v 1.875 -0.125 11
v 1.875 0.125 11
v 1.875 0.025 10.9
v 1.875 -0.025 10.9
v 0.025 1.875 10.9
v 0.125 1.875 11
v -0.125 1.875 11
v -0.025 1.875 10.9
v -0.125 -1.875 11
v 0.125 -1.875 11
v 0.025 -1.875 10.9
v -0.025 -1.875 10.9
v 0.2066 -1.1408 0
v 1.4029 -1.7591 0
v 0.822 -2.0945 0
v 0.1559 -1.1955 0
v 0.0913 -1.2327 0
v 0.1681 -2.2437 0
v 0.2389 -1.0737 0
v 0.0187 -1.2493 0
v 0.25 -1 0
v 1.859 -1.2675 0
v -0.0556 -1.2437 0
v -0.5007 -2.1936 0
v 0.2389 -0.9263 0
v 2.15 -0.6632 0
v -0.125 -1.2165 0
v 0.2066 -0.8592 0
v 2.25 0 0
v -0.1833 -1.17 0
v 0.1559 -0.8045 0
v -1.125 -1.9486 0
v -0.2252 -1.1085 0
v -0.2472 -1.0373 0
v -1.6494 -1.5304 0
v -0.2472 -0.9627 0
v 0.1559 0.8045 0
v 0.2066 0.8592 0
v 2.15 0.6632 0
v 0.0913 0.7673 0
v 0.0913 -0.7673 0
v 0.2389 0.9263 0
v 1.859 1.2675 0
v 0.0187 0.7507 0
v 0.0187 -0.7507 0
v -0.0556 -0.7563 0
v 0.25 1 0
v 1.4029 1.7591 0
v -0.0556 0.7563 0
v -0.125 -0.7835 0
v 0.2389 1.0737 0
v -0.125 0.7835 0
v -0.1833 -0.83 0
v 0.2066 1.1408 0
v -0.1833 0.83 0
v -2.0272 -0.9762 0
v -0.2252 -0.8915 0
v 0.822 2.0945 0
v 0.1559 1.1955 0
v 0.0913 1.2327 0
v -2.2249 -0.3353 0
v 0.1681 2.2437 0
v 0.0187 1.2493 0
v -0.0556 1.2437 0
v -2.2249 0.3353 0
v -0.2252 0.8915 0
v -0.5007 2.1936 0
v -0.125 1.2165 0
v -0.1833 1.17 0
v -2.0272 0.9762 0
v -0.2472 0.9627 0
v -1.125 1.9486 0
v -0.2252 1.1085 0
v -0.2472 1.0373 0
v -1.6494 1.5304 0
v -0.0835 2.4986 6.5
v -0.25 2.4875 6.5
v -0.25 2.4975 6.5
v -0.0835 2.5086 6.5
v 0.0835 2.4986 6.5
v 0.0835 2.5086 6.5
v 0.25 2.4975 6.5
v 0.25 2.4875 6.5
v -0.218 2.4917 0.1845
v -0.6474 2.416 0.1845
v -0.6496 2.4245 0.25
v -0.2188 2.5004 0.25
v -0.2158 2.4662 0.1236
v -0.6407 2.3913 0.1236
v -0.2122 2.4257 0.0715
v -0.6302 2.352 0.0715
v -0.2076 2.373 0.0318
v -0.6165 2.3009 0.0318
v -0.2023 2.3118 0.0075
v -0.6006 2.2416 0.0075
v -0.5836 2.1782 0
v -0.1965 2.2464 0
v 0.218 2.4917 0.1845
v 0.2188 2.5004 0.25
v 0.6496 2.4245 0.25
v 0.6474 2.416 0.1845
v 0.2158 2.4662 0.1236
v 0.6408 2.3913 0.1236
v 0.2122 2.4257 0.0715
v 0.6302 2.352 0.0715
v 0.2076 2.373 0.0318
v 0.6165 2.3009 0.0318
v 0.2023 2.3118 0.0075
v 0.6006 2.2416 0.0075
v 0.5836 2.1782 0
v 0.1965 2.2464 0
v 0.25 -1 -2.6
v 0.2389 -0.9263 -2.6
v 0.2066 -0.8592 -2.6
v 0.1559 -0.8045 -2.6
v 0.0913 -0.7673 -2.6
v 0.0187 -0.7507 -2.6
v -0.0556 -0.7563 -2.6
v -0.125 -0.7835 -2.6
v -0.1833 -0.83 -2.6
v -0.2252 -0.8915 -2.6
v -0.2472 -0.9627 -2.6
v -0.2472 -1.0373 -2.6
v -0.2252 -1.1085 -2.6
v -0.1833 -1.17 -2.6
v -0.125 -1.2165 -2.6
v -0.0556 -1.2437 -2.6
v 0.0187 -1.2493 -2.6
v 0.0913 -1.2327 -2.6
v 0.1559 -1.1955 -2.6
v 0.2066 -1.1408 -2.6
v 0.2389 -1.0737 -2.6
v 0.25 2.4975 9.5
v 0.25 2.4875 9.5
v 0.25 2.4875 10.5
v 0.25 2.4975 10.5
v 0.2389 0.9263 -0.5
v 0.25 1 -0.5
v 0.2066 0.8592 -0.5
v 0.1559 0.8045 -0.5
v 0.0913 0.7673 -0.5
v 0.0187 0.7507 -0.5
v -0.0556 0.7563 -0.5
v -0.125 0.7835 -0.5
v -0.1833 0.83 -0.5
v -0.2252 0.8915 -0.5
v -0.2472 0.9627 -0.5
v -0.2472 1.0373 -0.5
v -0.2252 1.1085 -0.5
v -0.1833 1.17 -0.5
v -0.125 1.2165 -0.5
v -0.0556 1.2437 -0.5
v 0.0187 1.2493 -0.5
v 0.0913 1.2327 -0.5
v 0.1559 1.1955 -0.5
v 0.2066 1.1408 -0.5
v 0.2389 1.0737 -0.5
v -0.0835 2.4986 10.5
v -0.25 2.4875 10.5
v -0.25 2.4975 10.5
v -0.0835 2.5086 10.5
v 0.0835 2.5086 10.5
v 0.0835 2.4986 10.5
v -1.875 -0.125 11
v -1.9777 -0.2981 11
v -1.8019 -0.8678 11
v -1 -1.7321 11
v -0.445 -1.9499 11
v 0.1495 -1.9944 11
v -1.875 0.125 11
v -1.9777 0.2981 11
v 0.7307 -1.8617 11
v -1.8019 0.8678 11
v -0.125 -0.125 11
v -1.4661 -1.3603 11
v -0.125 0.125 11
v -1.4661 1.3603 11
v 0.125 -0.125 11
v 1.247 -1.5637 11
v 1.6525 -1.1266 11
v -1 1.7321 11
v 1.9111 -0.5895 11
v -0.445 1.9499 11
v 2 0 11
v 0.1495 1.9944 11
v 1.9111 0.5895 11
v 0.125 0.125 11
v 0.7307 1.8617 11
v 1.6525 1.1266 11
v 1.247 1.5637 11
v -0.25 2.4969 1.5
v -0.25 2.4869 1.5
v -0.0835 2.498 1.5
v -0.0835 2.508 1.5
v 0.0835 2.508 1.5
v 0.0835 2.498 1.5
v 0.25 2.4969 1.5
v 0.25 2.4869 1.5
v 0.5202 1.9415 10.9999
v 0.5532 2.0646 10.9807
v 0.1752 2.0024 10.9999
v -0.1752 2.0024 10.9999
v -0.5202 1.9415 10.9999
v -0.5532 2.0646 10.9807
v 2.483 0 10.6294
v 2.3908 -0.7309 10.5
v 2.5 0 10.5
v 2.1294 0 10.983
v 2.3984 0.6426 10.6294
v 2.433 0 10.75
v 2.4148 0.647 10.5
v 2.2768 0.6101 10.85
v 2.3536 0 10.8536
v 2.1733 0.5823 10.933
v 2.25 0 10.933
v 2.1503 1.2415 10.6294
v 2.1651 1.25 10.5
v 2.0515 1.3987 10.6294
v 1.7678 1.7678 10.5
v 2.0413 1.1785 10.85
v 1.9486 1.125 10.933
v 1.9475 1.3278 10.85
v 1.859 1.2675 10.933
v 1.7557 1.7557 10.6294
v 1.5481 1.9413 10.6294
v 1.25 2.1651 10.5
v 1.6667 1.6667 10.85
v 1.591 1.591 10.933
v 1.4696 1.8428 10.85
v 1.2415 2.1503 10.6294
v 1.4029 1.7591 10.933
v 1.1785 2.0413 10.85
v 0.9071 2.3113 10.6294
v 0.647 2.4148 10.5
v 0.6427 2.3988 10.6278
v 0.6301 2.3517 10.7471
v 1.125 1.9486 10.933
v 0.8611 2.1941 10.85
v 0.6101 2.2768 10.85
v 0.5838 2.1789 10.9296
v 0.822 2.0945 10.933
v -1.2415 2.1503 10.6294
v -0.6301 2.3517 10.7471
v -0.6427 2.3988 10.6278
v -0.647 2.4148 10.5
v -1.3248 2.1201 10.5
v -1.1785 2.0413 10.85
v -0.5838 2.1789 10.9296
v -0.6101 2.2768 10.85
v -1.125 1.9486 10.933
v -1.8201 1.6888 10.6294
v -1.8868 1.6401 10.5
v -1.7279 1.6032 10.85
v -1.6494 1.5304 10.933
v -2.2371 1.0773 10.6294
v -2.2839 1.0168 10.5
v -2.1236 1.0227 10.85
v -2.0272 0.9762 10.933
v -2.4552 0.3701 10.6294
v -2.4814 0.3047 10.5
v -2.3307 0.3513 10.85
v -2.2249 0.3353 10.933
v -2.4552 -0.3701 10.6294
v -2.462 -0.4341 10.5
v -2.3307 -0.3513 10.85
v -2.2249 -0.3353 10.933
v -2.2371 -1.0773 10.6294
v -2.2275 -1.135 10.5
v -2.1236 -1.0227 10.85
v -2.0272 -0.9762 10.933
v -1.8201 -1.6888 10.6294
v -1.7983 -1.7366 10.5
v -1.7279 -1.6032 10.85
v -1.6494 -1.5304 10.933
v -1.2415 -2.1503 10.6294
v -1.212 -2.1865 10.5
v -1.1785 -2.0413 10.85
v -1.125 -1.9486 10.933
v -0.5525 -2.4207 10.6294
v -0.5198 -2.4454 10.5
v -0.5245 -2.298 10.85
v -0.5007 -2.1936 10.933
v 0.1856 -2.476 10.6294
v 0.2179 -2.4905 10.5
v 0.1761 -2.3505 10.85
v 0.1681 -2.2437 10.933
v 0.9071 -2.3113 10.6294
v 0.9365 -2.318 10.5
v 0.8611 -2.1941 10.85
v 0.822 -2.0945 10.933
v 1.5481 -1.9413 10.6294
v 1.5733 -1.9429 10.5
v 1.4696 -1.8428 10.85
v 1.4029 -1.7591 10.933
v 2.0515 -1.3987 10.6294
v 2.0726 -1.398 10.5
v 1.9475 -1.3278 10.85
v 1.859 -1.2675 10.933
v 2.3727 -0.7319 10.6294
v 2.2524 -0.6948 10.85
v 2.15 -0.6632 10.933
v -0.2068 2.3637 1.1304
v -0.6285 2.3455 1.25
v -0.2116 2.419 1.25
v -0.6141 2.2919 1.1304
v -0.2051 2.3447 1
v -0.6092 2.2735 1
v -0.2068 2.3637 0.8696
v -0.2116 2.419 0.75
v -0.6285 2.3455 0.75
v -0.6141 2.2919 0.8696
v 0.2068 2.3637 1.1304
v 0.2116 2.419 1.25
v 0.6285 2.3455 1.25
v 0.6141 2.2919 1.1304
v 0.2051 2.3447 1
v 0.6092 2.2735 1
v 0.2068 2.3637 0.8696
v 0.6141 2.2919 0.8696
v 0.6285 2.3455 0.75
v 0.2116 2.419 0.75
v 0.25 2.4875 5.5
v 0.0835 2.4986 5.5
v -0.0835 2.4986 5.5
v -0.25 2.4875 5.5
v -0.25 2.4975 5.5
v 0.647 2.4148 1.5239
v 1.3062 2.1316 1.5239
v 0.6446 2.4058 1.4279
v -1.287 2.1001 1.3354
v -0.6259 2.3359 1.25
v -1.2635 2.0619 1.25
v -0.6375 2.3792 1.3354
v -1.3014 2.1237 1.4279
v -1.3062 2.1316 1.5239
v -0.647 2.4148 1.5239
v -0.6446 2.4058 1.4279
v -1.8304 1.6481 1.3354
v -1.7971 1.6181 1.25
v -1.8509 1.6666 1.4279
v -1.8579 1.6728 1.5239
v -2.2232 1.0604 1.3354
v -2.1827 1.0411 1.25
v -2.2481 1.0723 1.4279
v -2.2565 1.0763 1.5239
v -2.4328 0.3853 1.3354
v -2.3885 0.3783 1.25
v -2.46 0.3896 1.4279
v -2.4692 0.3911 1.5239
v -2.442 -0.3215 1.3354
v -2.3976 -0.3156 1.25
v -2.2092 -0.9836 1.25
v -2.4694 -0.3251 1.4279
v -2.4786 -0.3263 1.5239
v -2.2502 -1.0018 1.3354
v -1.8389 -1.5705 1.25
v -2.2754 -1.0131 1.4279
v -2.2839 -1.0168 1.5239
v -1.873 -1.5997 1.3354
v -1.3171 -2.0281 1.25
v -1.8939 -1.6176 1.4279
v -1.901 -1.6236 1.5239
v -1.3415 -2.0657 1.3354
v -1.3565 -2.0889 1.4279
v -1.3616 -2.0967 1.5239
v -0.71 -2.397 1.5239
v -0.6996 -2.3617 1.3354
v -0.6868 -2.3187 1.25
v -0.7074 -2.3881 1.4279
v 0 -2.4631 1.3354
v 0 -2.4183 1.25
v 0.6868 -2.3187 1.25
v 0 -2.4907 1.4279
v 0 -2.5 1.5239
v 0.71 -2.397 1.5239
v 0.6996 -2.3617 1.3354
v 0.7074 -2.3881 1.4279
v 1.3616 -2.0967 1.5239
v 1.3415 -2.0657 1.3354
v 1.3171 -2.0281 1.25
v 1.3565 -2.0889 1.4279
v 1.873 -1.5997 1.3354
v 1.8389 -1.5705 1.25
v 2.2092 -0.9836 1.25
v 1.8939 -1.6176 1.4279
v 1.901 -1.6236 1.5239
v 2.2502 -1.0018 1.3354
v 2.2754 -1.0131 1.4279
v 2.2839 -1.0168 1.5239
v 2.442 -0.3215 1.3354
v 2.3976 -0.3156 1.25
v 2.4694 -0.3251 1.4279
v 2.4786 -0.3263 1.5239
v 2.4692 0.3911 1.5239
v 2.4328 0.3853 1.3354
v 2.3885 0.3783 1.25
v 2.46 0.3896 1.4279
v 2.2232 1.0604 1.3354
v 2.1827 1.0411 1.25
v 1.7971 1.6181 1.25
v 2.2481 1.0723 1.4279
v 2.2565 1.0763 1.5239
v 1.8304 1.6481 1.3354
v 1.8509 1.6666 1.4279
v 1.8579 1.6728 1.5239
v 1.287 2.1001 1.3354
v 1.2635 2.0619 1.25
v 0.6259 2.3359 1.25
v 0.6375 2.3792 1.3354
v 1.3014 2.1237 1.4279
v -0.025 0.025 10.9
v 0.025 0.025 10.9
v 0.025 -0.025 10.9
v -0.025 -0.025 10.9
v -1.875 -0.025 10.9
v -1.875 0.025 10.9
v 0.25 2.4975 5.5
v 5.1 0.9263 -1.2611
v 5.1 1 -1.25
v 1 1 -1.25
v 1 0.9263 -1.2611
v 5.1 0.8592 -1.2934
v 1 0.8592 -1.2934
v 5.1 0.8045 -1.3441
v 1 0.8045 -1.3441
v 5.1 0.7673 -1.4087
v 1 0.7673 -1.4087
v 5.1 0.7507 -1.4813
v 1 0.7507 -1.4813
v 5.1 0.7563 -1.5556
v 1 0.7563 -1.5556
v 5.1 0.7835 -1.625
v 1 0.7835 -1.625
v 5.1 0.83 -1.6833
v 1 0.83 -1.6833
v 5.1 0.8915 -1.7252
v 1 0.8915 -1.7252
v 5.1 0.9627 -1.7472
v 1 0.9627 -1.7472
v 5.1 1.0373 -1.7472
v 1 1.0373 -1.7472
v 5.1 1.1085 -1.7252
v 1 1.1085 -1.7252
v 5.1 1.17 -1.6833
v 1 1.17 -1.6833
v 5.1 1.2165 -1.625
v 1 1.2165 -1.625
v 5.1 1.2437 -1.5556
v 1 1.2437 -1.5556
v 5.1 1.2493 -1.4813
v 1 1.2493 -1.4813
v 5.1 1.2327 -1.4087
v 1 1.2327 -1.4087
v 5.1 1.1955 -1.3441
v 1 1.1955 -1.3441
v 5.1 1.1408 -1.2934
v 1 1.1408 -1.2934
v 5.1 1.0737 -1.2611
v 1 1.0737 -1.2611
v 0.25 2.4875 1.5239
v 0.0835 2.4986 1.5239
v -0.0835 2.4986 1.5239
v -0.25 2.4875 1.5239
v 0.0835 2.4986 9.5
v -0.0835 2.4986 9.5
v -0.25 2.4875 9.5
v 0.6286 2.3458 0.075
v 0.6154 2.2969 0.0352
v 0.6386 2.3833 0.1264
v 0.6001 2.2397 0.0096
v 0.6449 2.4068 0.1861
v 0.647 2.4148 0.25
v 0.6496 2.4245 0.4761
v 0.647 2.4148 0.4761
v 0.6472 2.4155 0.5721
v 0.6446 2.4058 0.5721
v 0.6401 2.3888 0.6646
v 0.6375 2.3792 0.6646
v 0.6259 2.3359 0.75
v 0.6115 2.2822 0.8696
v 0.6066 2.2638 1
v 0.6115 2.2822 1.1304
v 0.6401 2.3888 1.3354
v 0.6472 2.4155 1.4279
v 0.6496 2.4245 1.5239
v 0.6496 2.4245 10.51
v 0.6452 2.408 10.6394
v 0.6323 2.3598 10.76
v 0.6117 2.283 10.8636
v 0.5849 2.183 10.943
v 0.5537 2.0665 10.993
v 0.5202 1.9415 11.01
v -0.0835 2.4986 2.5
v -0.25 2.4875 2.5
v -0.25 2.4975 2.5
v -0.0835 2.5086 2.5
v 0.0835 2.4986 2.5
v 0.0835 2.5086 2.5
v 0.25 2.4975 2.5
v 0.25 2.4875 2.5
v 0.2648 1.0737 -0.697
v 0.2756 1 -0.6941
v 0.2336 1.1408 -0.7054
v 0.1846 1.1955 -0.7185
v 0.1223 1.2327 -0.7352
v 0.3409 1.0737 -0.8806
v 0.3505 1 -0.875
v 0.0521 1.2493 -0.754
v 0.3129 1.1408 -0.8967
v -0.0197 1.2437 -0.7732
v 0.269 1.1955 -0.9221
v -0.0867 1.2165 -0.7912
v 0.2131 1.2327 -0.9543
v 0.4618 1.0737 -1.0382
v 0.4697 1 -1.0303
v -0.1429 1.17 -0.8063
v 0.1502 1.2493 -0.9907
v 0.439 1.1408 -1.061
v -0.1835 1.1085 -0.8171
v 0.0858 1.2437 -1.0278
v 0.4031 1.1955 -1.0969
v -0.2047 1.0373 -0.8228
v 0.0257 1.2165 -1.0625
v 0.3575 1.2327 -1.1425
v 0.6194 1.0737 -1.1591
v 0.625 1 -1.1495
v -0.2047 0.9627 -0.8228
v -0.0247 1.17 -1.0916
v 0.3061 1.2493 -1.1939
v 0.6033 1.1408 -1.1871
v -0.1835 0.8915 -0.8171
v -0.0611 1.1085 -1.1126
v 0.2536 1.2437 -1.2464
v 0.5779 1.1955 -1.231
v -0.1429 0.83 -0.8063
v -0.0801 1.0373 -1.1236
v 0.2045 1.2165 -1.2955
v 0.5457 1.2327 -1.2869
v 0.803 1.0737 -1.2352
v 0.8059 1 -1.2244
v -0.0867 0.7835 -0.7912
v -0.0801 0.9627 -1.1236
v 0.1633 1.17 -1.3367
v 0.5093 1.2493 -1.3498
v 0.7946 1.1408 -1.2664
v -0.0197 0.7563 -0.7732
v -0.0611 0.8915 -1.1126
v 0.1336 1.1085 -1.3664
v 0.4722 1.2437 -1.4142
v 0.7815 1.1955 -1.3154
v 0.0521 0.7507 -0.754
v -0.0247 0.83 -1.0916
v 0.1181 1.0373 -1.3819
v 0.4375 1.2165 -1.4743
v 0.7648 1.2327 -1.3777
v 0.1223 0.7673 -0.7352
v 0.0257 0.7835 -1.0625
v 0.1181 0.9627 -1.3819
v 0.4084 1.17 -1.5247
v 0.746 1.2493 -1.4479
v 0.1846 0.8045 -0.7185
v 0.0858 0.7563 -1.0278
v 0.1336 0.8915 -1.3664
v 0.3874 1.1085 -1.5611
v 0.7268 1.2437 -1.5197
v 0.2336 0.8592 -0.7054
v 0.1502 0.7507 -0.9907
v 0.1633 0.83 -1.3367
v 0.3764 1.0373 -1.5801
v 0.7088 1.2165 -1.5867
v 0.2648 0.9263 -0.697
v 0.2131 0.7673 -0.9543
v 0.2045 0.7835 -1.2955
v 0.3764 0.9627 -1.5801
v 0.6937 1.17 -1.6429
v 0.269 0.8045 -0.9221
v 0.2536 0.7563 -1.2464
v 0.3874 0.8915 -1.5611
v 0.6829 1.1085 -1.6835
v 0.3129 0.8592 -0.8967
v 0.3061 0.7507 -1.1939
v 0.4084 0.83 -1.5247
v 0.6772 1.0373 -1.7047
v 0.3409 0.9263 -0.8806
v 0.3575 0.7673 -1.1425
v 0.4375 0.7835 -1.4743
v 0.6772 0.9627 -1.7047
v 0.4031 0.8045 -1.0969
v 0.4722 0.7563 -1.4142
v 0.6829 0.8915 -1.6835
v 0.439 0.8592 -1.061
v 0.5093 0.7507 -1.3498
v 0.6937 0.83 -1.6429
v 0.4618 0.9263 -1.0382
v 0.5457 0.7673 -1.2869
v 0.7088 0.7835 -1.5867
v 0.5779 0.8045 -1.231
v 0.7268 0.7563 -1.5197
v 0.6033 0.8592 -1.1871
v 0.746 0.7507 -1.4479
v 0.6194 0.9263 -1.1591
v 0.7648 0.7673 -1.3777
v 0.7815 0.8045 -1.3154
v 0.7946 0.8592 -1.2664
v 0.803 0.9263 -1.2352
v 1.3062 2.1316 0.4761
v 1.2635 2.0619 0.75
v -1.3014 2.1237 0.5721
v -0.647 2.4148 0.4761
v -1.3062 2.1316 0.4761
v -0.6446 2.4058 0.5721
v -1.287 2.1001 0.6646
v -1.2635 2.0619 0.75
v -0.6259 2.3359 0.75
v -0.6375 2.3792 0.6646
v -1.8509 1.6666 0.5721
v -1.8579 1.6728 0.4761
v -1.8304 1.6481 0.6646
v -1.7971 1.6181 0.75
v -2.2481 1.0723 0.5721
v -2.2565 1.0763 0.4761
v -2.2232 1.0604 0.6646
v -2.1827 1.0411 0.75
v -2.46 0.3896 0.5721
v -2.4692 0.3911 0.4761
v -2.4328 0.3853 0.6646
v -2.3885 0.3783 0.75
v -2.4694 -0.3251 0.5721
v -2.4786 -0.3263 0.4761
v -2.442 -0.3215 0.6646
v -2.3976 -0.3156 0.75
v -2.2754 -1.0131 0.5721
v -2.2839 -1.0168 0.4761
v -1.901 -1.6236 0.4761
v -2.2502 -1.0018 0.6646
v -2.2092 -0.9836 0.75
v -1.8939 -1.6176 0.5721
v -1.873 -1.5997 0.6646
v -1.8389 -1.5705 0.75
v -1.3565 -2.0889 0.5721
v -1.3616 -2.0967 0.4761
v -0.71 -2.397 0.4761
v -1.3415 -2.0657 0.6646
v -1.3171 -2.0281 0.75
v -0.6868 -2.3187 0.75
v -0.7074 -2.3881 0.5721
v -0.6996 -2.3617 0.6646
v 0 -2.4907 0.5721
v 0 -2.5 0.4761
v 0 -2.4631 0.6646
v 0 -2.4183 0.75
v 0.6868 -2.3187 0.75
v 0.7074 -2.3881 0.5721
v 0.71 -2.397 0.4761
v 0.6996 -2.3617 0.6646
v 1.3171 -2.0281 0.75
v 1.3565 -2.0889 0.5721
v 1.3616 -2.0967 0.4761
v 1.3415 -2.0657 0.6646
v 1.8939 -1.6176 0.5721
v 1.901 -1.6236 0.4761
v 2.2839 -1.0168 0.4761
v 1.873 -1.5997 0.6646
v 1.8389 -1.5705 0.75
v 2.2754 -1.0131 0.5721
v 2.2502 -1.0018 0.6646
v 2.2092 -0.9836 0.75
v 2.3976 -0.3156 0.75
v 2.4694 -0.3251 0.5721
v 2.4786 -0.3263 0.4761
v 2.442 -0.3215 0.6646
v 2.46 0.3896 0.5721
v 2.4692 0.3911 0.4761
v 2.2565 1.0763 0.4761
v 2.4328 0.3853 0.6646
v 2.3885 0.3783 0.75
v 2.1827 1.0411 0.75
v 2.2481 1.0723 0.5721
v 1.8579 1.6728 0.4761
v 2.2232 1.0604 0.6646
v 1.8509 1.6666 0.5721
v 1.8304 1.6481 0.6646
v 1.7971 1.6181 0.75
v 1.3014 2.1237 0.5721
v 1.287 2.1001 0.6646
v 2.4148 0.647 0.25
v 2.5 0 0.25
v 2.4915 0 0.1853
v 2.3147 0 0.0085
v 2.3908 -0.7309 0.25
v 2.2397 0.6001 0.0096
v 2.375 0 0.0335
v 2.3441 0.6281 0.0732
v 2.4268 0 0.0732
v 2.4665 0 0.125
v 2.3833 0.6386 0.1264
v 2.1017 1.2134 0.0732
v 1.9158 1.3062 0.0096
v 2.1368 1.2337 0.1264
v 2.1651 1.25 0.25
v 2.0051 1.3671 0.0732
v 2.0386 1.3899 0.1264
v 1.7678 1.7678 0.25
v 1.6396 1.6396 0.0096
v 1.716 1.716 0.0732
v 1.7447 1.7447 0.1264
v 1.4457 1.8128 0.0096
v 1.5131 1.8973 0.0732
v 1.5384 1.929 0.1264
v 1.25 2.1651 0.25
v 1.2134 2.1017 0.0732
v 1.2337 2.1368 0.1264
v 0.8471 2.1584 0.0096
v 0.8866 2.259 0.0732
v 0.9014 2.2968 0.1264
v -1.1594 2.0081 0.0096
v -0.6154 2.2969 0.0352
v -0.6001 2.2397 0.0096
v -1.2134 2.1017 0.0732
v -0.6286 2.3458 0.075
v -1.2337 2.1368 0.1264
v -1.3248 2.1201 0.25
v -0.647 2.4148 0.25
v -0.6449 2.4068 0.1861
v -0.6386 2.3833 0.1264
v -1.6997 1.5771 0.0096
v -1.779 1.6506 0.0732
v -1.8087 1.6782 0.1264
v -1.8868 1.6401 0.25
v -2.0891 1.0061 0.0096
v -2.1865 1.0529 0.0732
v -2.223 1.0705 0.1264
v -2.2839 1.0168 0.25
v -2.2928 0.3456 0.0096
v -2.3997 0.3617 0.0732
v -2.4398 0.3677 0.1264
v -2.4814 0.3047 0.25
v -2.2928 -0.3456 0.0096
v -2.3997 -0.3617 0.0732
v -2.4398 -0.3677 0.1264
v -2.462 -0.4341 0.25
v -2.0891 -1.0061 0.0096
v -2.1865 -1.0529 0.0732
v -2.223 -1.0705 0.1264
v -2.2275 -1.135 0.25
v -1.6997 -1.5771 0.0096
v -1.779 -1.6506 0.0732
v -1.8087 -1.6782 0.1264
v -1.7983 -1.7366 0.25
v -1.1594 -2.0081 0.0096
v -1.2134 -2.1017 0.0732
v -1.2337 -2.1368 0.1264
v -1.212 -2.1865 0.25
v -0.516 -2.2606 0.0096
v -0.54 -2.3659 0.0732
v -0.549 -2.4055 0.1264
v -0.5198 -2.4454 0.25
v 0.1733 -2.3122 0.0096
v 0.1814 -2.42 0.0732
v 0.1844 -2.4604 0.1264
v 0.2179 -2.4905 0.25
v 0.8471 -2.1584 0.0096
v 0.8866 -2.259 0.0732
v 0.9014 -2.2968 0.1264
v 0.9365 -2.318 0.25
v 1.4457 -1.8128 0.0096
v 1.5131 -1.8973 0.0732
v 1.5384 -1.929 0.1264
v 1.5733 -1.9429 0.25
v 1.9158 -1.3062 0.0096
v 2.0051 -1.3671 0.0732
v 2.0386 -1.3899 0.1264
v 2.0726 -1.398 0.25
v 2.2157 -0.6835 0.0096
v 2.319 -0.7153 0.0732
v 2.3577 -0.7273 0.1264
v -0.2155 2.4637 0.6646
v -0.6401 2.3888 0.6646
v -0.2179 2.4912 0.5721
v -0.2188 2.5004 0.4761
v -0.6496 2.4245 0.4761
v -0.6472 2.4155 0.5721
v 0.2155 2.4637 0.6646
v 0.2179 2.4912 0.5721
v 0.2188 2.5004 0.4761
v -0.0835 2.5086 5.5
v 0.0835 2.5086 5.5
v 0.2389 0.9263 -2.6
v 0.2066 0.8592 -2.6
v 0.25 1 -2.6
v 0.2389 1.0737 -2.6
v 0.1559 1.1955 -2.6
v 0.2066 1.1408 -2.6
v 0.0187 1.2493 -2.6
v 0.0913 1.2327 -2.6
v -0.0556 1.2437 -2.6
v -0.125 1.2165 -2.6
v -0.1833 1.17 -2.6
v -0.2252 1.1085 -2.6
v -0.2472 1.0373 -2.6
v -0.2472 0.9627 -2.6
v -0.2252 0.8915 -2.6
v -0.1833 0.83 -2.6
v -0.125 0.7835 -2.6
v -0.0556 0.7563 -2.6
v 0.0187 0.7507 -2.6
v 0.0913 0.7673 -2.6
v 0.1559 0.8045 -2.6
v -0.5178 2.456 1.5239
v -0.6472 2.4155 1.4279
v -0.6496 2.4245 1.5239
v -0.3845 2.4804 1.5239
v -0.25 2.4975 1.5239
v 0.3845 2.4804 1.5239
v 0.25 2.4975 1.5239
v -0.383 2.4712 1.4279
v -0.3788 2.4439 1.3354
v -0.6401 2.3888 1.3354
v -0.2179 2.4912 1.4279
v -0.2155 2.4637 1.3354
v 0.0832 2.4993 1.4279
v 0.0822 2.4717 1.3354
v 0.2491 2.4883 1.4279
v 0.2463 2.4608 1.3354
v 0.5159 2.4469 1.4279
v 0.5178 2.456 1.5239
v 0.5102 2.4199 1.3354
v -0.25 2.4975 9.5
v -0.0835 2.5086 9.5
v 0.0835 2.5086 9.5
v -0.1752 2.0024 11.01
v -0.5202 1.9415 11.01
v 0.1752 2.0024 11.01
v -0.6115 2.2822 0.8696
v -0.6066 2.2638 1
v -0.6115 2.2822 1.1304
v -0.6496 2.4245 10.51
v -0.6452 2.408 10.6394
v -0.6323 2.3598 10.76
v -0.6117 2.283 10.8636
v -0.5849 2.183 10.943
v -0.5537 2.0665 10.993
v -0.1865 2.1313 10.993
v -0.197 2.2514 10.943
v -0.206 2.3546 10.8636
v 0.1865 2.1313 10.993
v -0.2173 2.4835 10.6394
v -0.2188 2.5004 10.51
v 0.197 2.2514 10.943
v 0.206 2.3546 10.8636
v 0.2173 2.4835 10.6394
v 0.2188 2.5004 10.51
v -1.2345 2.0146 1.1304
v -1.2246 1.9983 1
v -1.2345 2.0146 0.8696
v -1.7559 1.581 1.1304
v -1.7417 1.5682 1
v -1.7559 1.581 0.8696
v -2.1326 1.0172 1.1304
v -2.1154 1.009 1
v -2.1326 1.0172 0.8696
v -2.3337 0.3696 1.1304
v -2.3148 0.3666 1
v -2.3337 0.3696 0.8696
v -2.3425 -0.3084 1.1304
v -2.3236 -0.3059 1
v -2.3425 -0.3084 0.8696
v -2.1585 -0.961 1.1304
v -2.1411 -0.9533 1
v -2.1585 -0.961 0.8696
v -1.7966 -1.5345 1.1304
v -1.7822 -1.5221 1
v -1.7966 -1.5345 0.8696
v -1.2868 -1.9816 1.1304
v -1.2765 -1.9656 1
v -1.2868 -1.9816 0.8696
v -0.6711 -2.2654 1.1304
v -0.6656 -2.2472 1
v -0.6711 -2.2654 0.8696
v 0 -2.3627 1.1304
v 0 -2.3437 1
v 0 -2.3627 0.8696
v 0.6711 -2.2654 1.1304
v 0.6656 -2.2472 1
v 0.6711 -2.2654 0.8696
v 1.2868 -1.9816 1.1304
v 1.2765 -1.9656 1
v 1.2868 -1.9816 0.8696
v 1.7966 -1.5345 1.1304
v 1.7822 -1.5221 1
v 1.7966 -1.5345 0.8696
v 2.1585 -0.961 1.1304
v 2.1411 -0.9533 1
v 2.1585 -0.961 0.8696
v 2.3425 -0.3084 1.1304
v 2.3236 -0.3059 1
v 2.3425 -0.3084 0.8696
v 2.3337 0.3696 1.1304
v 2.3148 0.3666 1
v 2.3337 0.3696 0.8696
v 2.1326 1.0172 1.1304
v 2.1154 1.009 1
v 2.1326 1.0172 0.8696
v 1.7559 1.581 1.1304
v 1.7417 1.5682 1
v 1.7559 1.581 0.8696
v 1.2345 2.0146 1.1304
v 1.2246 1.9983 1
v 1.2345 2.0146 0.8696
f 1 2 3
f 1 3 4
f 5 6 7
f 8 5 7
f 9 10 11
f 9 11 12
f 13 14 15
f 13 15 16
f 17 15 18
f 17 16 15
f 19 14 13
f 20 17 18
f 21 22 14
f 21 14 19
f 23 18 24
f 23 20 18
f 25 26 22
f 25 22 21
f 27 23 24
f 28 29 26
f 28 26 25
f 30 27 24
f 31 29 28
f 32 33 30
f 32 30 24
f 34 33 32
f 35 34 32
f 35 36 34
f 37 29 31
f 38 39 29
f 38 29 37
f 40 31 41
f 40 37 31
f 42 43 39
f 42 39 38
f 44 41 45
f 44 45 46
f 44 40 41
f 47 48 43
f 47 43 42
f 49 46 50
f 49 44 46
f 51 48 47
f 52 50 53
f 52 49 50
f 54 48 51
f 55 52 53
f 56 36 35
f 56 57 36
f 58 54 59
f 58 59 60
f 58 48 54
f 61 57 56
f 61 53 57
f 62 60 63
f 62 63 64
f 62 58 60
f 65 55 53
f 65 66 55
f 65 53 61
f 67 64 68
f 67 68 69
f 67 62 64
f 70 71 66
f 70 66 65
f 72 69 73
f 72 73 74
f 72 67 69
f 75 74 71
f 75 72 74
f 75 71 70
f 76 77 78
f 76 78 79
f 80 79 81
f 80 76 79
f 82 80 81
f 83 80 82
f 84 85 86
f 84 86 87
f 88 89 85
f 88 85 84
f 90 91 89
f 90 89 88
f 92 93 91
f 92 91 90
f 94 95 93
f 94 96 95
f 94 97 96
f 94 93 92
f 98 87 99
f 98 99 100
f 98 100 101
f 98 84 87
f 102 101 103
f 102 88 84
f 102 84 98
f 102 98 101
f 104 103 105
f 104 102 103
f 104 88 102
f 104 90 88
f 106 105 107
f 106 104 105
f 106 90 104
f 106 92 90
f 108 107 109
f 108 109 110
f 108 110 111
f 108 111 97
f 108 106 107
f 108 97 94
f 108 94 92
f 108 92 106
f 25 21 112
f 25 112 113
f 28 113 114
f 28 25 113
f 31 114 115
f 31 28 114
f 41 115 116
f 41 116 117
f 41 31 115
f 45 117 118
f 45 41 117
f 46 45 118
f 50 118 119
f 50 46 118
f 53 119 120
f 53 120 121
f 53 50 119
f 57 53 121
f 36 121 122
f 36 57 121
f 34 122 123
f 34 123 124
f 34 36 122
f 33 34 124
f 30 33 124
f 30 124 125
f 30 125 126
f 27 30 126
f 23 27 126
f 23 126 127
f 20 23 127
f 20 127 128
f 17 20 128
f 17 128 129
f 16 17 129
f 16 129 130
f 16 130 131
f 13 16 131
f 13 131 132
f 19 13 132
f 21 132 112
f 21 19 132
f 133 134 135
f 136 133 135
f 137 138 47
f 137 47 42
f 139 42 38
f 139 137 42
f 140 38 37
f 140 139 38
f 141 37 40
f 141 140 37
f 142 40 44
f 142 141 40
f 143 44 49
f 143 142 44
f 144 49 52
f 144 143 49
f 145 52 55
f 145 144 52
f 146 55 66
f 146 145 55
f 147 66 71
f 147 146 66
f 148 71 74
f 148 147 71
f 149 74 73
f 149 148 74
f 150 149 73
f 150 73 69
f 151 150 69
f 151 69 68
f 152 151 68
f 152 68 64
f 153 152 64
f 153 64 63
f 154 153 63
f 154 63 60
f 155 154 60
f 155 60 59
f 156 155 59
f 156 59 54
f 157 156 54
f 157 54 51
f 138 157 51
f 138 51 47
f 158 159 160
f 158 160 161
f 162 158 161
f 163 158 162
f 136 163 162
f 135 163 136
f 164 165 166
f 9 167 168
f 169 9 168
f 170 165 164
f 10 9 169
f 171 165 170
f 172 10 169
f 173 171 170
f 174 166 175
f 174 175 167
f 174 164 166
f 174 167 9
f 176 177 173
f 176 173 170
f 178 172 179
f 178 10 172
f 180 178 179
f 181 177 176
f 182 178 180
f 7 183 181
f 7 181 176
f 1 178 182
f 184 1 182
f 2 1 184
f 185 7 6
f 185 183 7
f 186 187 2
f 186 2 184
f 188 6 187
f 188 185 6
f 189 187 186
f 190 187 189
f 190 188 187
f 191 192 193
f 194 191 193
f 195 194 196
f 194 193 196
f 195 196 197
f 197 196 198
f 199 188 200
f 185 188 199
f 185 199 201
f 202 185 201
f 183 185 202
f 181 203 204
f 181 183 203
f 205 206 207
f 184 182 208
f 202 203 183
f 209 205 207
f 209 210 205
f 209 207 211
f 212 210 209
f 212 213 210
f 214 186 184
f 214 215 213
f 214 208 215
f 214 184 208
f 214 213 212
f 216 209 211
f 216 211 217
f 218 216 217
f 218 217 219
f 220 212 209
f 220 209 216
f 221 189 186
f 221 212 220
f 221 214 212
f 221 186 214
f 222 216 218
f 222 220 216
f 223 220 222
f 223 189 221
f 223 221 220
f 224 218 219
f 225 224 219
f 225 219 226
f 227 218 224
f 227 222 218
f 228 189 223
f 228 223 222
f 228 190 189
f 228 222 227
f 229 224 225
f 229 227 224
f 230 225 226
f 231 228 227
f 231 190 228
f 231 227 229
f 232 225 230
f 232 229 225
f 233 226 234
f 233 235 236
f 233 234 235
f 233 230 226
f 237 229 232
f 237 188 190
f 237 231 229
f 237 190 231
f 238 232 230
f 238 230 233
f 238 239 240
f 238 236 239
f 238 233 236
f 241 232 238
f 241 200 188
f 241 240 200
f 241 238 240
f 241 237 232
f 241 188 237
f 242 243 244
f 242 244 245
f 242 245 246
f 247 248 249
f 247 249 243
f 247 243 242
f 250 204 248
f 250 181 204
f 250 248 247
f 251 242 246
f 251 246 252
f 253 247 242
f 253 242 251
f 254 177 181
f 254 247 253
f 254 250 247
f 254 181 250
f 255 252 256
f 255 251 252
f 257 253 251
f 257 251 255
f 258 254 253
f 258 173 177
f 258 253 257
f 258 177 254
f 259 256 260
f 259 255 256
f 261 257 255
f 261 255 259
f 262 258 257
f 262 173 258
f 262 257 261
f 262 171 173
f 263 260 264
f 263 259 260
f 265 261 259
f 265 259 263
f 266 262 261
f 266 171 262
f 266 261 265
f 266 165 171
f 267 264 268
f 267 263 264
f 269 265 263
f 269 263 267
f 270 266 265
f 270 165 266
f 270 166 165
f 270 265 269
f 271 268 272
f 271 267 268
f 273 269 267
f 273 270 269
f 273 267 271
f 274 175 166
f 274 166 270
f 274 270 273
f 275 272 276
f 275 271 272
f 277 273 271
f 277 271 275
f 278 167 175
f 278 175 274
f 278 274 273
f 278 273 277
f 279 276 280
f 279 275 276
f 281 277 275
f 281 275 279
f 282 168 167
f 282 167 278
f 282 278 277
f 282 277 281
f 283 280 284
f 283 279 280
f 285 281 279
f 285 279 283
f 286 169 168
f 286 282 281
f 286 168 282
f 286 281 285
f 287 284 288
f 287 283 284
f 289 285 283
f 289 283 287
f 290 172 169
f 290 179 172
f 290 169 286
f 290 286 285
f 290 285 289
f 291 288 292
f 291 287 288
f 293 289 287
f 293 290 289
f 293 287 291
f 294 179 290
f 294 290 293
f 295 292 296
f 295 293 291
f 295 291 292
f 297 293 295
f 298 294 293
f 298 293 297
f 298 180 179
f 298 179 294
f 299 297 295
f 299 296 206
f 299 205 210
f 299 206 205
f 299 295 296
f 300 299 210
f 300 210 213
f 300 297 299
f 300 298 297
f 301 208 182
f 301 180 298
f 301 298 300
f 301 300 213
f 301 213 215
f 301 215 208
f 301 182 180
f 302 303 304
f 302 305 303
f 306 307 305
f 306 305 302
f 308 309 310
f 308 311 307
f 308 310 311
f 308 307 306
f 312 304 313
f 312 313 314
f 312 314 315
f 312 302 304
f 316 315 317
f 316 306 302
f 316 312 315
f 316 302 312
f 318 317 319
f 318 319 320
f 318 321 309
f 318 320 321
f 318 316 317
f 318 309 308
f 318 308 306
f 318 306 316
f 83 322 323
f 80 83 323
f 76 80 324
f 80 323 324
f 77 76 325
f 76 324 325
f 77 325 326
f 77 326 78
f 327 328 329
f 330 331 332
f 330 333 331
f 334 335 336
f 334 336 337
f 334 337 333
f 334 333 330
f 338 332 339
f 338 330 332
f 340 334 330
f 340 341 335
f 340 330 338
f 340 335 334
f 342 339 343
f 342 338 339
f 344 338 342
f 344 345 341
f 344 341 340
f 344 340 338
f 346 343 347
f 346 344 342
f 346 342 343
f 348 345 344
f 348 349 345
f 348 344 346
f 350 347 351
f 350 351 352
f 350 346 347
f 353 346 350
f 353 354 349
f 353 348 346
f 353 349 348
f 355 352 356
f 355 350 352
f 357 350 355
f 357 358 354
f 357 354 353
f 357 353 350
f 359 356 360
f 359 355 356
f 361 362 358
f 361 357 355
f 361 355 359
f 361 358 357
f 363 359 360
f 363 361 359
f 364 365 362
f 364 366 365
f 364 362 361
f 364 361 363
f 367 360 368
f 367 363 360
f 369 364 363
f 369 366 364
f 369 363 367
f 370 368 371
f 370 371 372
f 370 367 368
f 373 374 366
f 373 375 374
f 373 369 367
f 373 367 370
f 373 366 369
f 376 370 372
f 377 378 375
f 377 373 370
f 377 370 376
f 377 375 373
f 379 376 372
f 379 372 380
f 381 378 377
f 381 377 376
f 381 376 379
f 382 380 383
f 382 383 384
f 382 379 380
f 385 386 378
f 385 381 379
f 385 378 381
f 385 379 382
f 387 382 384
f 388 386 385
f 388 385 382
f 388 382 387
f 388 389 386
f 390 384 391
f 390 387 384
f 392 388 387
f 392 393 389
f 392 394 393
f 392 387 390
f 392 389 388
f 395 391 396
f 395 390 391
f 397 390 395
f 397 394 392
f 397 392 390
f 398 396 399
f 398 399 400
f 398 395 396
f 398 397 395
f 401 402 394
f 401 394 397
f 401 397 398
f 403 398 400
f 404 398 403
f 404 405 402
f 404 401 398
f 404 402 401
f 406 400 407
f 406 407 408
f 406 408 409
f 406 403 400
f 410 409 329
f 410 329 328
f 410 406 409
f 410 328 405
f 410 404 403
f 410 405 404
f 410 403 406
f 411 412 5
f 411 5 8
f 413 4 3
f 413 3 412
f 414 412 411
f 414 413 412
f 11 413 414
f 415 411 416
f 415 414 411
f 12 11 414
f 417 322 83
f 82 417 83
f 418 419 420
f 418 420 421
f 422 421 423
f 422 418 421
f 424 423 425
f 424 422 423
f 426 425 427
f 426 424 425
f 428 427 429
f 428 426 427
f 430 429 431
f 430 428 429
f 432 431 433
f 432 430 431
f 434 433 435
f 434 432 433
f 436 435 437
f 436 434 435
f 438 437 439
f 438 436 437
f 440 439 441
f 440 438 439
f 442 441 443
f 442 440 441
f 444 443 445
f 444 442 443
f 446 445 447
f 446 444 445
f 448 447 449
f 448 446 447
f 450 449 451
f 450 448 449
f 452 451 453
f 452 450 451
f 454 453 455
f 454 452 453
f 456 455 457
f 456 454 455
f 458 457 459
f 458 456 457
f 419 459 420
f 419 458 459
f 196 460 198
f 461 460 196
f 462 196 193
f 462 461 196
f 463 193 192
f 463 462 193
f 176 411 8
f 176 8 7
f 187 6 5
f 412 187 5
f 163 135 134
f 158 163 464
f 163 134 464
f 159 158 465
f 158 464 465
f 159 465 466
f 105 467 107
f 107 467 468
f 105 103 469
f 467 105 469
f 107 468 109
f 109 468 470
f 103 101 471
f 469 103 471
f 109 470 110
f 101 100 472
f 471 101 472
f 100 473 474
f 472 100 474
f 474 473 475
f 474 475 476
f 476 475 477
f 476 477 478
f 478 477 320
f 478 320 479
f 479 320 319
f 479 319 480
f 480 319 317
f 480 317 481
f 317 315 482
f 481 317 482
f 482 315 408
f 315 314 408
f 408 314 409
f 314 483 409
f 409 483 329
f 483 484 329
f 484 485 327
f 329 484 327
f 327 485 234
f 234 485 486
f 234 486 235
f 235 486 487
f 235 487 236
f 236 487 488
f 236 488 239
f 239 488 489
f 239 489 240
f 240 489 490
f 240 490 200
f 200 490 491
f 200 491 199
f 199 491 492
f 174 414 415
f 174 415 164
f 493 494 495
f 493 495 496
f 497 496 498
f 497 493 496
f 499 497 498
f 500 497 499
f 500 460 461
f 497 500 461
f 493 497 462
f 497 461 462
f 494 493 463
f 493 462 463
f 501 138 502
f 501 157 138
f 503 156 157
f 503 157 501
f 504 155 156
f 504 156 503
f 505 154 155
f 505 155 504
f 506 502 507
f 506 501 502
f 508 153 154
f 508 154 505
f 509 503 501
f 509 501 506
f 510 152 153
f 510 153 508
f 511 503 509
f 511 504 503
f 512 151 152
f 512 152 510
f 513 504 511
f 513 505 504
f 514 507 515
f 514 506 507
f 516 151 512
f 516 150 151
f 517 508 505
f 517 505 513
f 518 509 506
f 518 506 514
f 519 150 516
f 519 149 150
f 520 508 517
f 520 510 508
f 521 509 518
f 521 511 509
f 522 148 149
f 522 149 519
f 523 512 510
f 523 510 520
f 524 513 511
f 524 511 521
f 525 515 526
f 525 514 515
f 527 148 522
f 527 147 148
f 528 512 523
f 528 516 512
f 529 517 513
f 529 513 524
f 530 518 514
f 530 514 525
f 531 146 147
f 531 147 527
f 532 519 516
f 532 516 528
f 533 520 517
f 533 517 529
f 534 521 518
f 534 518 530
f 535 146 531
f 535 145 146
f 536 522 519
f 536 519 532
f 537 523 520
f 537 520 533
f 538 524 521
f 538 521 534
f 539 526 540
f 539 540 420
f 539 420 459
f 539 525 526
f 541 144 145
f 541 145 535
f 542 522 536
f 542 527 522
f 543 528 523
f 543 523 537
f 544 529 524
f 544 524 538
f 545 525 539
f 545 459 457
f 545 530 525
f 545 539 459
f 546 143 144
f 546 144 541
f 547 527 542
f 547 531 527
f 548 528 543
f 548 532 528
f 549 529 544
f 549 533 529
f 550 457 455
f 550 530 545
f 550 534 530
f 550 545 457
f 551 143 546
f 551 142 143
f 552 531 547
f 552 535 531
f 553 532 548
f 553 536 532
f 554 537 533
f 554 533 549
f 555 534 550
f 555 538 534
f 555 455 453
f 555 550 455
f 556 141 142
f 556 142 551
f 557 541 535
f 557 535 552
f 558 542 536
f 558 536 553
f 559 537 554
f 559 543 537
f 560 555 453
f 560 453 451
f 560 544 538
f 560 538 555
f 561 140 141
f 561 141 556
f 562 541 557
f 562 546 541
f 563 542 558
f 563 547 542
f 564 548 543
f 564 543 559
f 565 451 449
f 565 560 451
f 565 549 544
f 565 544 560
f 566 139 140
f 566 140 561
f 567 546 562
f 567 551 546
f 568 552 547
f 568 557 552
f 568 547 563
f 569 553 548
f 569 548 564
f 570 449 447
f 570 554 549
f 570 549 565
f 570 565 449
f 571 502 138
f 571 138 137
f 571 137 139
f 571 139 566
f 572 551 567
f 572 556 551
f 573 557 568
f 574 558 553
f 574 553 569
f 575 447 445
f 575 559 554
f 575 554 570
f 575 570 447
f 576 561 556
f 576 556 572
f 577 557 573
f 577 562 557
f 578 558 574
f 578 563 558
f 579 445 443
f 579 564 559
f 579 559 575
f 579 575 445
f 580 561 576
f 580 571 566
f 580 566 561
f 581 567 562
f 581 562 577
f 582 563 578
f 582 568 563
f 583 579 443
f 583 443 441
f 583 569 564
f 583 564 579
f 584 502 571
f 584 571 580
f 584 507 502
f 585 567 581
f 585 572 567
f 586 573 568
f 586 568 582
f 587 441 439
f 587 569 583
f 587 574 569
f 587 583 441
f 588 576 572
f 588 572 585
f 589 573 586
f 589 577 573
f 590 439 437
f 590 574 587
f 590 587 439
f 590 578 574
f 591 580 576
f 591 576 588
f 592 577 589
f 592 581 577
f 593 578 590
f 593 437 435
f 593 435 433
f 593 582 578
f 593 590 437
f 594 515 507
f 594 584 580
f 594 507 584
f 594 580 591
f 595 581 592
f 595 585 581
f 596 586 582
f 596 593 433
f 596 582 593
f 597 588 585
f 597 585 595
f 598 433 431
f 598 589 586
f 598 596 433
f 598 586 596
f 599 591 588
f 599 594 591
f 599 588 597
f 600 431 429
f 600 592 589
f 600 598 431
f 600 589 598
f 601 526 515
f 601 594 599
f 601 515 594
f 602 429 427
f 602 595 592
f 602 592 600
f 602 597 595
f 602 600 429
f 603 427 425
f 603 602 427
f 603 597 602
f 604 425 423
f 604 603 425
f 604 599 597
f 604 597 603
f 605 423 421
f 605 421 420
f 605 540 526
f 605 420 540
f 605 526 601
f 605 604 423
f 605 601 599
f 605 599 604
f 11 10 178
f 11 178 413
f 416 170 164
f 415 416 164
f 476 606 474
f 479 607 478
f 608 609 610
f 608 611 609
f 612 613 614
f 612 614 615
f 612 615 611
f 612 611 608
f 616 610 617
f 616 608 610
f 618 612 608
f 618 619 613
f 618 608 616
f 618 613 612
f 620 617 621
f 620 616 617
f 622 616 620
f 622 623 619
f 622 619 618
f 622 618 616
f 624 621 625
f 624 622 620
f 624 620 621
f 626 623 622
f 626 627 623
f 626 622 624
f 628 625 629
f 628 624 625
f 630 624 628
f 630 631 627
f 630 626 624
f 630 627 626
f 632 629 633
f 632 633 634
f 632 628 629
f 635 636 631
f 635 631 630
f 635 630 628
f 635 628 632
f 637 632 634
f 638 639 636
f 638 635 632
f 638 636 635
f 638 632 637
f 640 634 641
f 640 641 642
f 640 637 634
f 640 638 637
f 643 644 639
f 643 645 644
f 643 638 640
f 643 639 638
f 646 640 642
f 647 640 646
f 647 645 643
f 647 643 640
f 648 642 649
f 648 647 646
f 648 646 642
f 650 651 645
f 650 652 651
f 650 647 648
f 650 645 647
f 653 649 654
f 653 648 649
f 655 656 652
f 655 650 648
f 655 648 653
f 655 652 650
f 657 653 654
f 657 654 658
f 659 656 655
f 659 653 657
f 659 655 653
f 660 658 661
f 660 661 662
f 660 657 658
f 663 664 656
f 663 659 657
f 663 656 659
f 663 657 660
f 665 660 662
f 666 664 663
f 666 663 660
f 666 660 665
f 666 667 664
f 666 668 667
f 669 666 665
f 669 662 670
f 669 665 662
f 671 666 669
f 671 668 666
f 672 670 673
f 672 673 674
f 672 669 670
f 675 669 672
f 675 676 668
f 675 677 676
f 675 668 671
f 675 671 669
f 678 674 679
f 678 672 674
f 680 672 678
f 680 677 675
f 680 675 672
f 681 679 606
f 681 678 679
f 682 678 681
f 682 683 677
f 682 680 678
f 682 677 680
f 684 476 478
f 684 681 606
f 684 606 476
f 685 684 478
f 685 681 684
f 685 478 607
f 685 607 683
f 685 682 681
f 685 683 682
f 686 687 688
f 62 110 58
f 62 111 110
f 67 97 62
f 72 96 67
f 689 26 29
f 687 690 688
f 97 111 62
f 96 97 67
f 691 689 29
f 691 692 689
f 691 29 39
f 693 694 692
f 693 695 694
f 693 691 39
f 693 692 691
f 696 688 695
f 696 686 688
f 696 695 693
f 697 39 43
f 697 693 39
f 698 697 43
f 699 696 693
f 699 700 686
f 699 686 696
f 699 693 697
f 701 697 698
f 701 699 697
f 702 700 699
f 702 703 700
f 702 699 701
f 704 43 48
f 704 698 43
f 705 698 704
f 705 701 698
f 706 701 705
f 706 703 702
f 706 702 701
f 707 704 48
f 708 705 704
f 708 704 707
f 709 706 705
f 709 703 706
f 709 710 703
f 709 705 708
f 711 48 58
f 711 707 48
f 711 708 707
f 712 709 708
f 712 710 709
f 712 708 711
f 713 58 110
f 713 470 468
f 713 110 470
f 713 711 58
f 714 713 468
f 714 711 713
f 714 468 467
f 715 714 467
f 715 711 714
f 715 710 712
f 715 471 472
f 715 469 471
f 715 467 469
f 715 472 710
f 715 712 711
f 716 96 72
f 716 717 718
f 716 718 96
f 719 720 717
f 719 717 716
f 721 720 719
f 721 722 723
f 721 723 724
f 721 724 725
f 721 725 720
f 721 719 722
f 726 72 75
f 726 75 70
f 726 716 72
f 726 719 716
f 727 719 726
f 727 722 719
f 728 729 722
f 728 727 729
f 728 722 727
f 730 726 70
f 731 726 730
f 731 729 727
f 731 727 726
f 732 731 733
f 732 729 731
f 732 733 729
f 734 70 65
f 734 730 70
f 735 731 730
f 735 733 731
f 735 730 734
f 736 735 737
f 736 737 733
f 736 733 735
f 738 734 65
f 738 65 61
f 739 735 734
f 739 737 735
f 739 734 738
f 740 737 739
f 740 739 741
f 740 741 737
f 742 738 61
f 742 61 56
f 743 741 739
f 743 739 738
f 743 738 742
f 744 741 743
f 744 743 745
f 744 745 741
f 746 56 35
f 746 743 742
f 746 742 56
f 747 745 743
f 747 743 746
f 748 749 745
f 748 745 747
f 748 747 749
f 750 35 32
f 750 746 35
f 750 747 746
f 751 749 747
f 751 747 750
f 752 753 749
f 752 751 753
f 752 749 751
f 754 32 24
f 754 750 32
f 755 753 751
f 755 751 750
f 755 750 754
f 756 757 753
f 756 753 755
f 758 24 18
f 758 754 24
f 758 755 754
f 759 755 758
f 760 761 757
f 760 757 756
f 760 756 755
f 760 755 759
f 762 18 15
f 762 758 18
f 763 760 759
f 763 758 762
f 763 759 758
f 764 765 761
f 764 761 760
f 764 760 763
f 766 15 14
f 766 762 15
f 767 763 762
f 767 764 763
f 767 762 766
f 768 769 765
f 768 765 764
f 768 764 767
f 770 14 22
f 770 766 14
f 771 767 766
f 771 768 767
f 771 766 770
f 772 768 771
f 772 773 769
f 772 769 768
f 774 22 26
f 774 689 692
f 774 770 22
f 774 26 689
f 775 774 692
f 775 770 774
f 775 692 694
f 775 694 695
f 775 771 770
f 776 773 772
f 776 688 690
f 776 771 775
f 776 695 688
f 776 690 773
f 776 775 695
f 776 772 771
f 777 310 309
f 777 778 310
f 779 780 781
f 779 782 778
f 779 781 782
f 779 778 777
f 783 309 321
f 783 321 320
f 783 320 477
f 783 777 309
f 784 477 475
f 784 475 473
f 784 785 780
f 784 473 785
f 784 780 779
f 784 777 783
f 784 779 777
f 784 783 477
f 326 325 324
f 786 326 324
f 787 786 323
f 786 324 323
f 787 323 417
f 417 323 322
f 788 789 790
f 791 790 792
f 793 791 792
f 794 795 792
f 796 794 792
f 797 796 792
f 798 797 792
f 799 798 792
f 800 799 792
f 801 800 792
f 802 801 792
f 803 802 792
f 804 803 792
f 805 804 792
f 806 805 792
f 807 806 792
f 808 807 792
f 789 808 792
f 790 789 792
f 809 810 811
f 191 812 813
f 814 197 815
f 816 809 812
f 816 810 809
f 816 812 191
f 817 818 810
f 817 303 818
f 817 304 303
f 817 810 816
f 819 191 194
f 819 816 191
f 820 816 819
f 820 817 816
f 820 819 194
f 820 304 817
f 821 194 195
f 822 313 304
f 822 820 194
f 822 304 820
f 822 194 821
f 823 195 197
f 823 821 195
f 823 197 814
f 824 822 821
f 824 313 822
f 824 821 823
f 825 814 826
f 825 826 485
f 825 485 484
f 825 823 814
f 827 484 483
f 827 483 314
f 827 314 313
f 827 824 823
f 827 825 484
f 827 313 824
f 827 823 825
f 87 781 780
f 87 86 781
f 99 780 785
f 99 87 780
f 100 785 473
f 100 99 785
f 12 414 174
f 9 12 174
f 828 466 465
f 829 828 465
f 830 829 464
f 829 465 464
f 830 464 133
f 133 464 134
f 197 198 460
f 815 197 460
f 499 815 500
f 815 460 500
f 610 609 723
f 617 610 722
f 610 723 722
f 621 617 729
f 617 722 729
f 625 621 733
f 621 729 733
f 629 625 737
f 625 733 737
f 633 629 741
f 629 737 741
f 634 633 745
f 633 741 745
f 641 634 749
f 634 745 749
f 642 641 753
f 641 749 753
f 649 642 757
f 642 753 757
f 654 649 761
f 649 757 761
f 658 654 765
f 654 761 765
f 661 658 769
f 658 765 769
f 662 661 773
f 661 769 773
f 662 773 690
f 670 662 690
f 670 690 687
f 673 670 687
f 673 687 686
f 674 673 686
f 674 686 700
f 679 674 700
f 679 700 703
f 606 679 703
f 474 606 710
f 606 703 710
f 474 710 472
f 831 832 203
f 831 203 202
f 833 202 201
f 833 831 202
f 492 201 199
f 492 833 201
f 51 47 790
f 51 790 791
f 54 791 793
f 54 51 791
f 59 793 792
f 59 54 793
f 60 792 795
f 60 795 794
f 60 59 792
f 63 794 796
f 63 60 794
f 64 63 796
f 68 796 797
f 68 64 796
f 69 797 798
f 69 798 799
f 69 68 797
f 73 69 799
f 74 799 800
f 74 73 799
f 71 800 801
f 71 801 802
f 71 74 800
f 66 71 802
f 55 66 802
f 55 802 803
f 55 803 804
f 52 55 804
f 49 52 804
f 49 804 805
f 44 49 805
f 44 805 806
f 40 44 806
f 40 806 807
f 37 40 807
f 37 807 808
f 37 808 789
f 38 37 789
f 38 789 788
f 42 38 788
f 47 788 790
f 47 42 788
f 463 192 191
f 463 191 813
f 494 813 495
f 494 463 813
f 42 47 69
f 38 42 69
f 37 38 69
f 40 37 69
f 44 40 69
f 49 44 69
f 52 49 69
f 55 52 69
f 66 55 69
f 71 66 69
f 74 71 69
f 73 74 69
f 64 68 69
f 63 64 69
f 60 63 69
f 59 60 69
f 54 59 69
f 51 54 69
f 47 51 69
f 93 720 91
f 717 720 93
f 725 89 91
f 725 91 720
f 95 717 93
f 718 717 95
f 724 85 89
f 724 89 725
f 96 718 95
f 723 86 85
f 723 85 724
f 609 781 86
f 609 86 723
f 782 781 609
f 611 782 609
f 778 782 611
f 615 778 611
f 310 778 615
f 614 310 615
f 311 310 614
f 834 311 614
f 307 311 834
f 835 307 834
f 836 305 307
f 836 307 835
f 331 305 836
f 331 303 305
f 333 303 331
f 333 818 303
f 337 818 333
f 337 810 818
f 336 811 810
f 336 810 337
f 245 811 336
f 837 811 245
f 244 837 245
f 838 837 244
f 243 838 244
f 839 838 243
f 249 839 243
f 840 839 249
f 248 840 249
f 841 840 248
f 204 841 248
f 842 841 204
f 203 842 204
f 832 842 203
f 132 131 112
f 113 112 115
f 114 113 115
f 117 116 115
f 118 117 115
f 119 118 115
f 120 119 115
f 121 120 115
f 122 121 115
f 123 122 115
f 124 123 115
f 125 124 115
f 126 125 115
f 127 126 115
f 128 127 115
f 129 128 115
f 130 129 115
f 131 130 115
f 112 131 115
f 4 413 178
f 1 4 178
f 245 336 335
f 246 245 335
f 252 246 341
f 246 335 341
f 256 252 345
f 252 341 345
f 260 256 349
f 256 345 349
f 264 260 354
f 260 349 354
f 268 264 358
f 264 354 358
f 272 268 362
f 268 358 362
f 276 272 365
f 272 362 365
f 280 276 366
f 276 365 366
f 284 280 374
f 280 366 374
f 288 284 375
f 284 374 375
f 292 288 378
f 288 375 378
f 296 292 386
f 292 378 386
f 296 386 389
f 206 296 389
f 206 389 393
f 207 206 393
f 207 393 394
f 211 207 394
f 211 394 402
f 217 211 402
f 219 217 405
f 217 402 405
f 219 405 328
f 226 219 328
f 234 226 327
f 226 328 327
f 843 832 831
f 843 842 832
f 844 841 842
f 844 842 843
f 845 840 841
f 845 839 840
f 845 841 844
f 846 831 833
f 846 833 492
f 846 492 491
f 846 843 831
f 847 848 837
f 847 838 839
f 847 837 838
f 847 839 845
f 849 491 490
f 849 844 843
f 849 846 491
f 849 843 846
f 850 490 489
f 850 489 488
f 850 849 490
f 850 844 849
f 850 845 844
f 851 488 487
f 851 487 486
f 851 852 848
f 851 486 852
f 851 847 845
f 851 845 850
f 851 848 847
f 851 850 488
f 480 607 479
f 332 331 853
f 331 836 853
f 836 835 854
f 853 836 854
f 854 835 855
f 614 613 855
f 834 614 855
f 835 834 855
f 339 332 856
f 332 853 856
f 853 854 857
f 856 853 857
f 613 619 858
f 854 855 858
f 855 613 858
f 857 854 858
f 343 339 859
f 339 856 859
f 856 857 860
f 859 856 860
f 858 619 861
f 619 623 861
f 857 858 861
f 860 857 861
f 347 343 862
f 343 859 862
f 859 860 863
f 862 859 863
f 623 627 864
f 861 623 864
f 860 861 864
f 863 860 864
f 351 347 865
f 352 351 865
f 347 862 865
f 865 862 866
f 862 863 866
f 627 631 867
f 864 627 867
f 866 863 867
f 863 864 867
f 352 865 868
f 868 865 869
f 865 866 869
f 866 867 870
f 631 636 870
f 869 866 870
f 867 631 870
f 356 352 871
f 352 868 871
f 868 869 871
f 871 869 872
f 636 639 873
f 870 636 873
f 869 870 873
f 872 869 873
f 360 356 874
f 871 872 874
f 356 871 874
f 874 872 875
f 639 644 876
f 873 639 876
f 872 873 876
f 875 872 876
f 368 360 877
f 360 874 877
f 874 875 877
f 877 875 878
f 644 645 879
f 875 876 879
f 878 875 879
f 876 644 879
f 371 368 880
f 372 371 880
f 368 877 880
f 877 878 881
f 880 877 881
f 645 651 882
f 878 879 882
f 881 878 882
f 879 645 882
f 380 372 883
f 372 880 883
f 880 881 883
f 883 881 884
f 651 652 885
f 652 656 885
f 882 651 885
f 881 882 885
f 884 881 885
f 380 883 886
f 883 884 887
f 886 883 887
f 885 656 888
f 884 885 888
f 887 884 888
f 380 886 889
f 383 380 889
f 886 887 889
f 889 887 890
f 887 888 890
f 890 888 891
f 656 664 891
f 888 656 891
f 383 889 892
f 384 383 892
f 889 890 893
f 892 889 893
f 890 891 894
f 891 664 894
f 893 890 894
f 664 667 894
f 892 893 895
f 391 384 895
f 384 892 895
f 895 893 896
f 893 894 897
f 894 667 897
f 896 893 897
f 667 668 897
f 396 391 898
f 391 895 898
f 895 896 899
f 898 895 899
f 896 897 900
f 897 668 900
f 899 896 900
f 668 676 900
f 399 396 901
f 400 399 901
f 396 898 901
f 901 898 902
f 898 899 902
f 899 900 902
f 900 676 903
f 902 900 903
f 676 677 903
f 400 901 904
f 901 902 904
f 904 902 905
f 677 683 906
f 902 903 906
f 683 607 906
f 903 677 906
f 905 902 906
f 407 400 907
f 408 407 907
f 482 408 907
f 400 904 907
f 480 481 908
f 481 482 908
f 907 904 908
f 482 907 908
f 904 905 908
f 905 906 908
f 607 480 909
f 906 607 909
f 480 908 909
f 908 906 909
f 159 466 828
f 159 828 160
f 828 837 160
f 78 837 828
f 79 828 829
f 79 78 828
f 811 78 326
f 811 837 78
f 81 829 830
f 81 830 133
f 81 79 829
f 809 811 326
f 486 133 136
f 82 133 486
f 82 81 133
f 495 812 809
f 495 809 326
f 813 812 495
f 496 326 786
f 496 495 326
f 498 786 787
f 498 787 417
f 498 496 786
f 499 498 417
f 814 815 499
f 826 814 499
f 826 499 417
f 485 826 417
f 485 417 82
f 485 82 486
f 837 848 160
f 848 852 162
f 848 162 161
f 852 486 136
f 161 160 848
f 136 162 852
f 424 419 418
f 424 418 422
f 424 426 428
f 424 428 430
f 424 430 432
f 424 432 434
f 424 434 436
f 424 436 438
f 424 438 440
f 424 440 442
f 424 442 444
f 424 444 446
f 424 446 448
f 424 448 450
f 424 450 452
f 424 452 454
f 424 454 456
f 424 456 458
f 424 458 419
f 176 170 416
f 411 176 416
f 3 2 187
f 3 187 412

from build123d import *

# Parameters (mm, degrees)
SKETCH003_R         = 0.25
REVOLUTION001_ANGLE = -30
SKETCH015_W         = 0.5
SKETCH015_H         = 1
POCKET002_DEPTH     = 2.511
LINEARPATTERN_COUNT = 3
LINEARPATTERN_PITCH = 4
SKETCH010_R         = 0.25
PAD002_DEPTH        = 2.6
SKETCH013_R         = 2
PAD_DEPTH           = 0.5
POCKET001_DEPTH     = 1.875
POLARPATTERN_COUNT  = 3
POLARPATTERN_ANGLE  = 180
SKETCH012_R         = 2
POCKET_DEPTH        = 0.5


with BuildPart() as leadangledclone:
    # AdditivePipe: sweep along a path in Sketch004
    with BuildLine(Plane.XZ) as additivepipe_path:
        Line((0, 0), (0, -0.5))
        ThreePointArc((0, -0.5), (0.292893, -1.207107), (1, -1.5))
        Line((1, -1.5), (5.1, -1.5))
    # Sketch003 (on ShapeBinder) → AdditivePipe (sweep)
    with BuildSketch(Plane(origin=(0, 0, 0), x_dir=(1, 0, 0), z_dir=(0, 0, -1))):
        with Locations((0, 1)):
            Circle(SKETCH003_R)
    sweep(path=additivepipe_path.line)


with BuildPart() as leadangledclone_1:
    # Body003 placement: moved
    add(leadangledclone.part.moved(Location((0, 2, 0))))


with BuildPart() as polaritymarking:
    # Sketch005 → Revolution001 (revolve)
    with BuildSketch(Plane(origin=(0, 0, 0), x_dir=(-0.258819, 0.965926, 0), z_dir=(0.965926, 0.258819, 0))):
        with BuildLine():
            Line((2.01, 0.25), (2.01, 11.01))
            ThreePointArc((2.01, 11.01), (2.363553, 10.863553), (2.51, 10.51))
            Line((2.51, 10.51), (2.51, 1.523941))
            ThreePointArc((2.51, 1.523941), (2.489134, 1.381006), (2.428278, 1.25))
            ThreePointArc((2.428278, 1.25), (2.353698, 1), (2.428278, 0.75))
            ThreePointArc((2.428278, 0.75), (2.489134, 0.618994), (2.51, 0.476059))
            Line((2.51, 0.476059), (2.51, 0.25))
            ThreePointArc((2.51, 0.25), (2.26, 0), (2.01, 0.25))
        make_face()
    revolve(axis=Axis((0, 0, 0), (0, 0, 1)), revolution_arc=REVOLUTION001_ANGLE)

    # Sketch015 → Pocket002 (cut, through all)
    with BuildSketch(Plane.XZ):
        with Locations((0, 2)):
            Rectangle(SKETCH015_W, SKETCH015_H)
    pocket002 = extrude(amount=-POCKET002_DEPTH, mode=Mode.SUBTRACT)

    # LinearPattern: Pocket002 ×3
    with Locations(*[(0, 0, i * LINEARPATTERN_PITCH) for i in range(1, LINEARPATTERN_COUNT)]):
        add(pocket002, mode=Mode.SUBTRACT)


with BuildPart() as leadstraight:
    # Sketch010 → Pad002 (new body)
    with BuildSketch(Plane(origin=(0, 1, 0), x_dir=(1, 0, 0), z_dir=(0, 0, 1))):
        Circle(SKETCH010_R)
    extrude(amount=-PAD002_DEPTH)


with BuildPart() as leadstraightclone:
    # Body007 base: copy of LeadStraight
    add(leadstraight.part)


with BuildPart() as leadstraightclone_1:
    # Body007 placement: moved
    add(leadstraightclone.part.moved(Location((0, -2, 0))))


with BuildPart() as housingtop:
    # Sketch013 (on ShapeBinder) → Pad (new body)
    with BuildSketch(Plane.XY.offset(10.5)):
        Circle(SKETCH013_R)
    extrude(amount=PAD_DEPTH)

    # Sketch014 → Pocket001 (cut, symmetric)
    with BuildSketch(Plane.XZ):
        Polygon((-0.125, 11), (0.125, 11), (0.025, 10.9), (-0.025, 10.9), align=None)
    pocket001 = extrude(amount=POCKET001_DEPTH, both=True, mode=Mode.SUBTRACT)

    # PolarPattern: Pocket001 ×3 about axis
    polarpattern_axis = Axis((0, 0, 0), (0, 0, 1))
    for i in range(1, POLARPATTERN_COUNT):
        add(pocket001.rotate(polarpattern_axis, i * POLARPATTERN_ANGLE / (POLARPATTERN_COUNT - 1)), mode=Mode.SUBTRACT)


with BuildPart() as fusion:
    # Sketch → Revolution (revolve)
    with BuildSketch(Plane.XZ):
        with BuildLine():
            Line((0, 11), (2, 11))
            ThreePointArc((2.5, 10.5), (2.353553, 10.853553), (2, 11))
            Line((2.5, 10.5), (2.5, 1.523941))
            ThreePointArc((2.418278, 1.25), (2.479134, 1.381006), (2.5, 1.523941))
            ThreePointArc((2.418278, 1.25), (2.343698, 1), (2.418278, 0.75))
            ThreePointArc((2.5, 0.476059), (2.479134, 0.618994), (2.418278, 0.75))
            Line((2.5, 0.476059), (2.5, 0.25))
            ThreePointArc((2.25, 0), (2.426777, 0.073223), (2.5, 0.25))
            Line((0, 0), (2.25, 0))
            Line((0, 11), (0, 0))
        make_face()
    revolve(axis=Axis((0, 0, 0), (0, 0, 1)))

    # Sketch012 → Pocket (cut)
    with BuildSketch(Plane.XY.offset(11)):
        Circle(SKETCH012_R)
    extrude(amount=-POCKET_DEPTH, mode=Mode.SUBTRACT)

    # Fusion: union PolarityMarking, LeadStraight, LeadStraightClone, HousingTop
    add(polaritymarking.part)
    add(leadstraight.part)
    add(leadstraightclone_1.part)
    add(housingtop.part)


solid = Compound([leadangledclone_1.part, fusion.part])
